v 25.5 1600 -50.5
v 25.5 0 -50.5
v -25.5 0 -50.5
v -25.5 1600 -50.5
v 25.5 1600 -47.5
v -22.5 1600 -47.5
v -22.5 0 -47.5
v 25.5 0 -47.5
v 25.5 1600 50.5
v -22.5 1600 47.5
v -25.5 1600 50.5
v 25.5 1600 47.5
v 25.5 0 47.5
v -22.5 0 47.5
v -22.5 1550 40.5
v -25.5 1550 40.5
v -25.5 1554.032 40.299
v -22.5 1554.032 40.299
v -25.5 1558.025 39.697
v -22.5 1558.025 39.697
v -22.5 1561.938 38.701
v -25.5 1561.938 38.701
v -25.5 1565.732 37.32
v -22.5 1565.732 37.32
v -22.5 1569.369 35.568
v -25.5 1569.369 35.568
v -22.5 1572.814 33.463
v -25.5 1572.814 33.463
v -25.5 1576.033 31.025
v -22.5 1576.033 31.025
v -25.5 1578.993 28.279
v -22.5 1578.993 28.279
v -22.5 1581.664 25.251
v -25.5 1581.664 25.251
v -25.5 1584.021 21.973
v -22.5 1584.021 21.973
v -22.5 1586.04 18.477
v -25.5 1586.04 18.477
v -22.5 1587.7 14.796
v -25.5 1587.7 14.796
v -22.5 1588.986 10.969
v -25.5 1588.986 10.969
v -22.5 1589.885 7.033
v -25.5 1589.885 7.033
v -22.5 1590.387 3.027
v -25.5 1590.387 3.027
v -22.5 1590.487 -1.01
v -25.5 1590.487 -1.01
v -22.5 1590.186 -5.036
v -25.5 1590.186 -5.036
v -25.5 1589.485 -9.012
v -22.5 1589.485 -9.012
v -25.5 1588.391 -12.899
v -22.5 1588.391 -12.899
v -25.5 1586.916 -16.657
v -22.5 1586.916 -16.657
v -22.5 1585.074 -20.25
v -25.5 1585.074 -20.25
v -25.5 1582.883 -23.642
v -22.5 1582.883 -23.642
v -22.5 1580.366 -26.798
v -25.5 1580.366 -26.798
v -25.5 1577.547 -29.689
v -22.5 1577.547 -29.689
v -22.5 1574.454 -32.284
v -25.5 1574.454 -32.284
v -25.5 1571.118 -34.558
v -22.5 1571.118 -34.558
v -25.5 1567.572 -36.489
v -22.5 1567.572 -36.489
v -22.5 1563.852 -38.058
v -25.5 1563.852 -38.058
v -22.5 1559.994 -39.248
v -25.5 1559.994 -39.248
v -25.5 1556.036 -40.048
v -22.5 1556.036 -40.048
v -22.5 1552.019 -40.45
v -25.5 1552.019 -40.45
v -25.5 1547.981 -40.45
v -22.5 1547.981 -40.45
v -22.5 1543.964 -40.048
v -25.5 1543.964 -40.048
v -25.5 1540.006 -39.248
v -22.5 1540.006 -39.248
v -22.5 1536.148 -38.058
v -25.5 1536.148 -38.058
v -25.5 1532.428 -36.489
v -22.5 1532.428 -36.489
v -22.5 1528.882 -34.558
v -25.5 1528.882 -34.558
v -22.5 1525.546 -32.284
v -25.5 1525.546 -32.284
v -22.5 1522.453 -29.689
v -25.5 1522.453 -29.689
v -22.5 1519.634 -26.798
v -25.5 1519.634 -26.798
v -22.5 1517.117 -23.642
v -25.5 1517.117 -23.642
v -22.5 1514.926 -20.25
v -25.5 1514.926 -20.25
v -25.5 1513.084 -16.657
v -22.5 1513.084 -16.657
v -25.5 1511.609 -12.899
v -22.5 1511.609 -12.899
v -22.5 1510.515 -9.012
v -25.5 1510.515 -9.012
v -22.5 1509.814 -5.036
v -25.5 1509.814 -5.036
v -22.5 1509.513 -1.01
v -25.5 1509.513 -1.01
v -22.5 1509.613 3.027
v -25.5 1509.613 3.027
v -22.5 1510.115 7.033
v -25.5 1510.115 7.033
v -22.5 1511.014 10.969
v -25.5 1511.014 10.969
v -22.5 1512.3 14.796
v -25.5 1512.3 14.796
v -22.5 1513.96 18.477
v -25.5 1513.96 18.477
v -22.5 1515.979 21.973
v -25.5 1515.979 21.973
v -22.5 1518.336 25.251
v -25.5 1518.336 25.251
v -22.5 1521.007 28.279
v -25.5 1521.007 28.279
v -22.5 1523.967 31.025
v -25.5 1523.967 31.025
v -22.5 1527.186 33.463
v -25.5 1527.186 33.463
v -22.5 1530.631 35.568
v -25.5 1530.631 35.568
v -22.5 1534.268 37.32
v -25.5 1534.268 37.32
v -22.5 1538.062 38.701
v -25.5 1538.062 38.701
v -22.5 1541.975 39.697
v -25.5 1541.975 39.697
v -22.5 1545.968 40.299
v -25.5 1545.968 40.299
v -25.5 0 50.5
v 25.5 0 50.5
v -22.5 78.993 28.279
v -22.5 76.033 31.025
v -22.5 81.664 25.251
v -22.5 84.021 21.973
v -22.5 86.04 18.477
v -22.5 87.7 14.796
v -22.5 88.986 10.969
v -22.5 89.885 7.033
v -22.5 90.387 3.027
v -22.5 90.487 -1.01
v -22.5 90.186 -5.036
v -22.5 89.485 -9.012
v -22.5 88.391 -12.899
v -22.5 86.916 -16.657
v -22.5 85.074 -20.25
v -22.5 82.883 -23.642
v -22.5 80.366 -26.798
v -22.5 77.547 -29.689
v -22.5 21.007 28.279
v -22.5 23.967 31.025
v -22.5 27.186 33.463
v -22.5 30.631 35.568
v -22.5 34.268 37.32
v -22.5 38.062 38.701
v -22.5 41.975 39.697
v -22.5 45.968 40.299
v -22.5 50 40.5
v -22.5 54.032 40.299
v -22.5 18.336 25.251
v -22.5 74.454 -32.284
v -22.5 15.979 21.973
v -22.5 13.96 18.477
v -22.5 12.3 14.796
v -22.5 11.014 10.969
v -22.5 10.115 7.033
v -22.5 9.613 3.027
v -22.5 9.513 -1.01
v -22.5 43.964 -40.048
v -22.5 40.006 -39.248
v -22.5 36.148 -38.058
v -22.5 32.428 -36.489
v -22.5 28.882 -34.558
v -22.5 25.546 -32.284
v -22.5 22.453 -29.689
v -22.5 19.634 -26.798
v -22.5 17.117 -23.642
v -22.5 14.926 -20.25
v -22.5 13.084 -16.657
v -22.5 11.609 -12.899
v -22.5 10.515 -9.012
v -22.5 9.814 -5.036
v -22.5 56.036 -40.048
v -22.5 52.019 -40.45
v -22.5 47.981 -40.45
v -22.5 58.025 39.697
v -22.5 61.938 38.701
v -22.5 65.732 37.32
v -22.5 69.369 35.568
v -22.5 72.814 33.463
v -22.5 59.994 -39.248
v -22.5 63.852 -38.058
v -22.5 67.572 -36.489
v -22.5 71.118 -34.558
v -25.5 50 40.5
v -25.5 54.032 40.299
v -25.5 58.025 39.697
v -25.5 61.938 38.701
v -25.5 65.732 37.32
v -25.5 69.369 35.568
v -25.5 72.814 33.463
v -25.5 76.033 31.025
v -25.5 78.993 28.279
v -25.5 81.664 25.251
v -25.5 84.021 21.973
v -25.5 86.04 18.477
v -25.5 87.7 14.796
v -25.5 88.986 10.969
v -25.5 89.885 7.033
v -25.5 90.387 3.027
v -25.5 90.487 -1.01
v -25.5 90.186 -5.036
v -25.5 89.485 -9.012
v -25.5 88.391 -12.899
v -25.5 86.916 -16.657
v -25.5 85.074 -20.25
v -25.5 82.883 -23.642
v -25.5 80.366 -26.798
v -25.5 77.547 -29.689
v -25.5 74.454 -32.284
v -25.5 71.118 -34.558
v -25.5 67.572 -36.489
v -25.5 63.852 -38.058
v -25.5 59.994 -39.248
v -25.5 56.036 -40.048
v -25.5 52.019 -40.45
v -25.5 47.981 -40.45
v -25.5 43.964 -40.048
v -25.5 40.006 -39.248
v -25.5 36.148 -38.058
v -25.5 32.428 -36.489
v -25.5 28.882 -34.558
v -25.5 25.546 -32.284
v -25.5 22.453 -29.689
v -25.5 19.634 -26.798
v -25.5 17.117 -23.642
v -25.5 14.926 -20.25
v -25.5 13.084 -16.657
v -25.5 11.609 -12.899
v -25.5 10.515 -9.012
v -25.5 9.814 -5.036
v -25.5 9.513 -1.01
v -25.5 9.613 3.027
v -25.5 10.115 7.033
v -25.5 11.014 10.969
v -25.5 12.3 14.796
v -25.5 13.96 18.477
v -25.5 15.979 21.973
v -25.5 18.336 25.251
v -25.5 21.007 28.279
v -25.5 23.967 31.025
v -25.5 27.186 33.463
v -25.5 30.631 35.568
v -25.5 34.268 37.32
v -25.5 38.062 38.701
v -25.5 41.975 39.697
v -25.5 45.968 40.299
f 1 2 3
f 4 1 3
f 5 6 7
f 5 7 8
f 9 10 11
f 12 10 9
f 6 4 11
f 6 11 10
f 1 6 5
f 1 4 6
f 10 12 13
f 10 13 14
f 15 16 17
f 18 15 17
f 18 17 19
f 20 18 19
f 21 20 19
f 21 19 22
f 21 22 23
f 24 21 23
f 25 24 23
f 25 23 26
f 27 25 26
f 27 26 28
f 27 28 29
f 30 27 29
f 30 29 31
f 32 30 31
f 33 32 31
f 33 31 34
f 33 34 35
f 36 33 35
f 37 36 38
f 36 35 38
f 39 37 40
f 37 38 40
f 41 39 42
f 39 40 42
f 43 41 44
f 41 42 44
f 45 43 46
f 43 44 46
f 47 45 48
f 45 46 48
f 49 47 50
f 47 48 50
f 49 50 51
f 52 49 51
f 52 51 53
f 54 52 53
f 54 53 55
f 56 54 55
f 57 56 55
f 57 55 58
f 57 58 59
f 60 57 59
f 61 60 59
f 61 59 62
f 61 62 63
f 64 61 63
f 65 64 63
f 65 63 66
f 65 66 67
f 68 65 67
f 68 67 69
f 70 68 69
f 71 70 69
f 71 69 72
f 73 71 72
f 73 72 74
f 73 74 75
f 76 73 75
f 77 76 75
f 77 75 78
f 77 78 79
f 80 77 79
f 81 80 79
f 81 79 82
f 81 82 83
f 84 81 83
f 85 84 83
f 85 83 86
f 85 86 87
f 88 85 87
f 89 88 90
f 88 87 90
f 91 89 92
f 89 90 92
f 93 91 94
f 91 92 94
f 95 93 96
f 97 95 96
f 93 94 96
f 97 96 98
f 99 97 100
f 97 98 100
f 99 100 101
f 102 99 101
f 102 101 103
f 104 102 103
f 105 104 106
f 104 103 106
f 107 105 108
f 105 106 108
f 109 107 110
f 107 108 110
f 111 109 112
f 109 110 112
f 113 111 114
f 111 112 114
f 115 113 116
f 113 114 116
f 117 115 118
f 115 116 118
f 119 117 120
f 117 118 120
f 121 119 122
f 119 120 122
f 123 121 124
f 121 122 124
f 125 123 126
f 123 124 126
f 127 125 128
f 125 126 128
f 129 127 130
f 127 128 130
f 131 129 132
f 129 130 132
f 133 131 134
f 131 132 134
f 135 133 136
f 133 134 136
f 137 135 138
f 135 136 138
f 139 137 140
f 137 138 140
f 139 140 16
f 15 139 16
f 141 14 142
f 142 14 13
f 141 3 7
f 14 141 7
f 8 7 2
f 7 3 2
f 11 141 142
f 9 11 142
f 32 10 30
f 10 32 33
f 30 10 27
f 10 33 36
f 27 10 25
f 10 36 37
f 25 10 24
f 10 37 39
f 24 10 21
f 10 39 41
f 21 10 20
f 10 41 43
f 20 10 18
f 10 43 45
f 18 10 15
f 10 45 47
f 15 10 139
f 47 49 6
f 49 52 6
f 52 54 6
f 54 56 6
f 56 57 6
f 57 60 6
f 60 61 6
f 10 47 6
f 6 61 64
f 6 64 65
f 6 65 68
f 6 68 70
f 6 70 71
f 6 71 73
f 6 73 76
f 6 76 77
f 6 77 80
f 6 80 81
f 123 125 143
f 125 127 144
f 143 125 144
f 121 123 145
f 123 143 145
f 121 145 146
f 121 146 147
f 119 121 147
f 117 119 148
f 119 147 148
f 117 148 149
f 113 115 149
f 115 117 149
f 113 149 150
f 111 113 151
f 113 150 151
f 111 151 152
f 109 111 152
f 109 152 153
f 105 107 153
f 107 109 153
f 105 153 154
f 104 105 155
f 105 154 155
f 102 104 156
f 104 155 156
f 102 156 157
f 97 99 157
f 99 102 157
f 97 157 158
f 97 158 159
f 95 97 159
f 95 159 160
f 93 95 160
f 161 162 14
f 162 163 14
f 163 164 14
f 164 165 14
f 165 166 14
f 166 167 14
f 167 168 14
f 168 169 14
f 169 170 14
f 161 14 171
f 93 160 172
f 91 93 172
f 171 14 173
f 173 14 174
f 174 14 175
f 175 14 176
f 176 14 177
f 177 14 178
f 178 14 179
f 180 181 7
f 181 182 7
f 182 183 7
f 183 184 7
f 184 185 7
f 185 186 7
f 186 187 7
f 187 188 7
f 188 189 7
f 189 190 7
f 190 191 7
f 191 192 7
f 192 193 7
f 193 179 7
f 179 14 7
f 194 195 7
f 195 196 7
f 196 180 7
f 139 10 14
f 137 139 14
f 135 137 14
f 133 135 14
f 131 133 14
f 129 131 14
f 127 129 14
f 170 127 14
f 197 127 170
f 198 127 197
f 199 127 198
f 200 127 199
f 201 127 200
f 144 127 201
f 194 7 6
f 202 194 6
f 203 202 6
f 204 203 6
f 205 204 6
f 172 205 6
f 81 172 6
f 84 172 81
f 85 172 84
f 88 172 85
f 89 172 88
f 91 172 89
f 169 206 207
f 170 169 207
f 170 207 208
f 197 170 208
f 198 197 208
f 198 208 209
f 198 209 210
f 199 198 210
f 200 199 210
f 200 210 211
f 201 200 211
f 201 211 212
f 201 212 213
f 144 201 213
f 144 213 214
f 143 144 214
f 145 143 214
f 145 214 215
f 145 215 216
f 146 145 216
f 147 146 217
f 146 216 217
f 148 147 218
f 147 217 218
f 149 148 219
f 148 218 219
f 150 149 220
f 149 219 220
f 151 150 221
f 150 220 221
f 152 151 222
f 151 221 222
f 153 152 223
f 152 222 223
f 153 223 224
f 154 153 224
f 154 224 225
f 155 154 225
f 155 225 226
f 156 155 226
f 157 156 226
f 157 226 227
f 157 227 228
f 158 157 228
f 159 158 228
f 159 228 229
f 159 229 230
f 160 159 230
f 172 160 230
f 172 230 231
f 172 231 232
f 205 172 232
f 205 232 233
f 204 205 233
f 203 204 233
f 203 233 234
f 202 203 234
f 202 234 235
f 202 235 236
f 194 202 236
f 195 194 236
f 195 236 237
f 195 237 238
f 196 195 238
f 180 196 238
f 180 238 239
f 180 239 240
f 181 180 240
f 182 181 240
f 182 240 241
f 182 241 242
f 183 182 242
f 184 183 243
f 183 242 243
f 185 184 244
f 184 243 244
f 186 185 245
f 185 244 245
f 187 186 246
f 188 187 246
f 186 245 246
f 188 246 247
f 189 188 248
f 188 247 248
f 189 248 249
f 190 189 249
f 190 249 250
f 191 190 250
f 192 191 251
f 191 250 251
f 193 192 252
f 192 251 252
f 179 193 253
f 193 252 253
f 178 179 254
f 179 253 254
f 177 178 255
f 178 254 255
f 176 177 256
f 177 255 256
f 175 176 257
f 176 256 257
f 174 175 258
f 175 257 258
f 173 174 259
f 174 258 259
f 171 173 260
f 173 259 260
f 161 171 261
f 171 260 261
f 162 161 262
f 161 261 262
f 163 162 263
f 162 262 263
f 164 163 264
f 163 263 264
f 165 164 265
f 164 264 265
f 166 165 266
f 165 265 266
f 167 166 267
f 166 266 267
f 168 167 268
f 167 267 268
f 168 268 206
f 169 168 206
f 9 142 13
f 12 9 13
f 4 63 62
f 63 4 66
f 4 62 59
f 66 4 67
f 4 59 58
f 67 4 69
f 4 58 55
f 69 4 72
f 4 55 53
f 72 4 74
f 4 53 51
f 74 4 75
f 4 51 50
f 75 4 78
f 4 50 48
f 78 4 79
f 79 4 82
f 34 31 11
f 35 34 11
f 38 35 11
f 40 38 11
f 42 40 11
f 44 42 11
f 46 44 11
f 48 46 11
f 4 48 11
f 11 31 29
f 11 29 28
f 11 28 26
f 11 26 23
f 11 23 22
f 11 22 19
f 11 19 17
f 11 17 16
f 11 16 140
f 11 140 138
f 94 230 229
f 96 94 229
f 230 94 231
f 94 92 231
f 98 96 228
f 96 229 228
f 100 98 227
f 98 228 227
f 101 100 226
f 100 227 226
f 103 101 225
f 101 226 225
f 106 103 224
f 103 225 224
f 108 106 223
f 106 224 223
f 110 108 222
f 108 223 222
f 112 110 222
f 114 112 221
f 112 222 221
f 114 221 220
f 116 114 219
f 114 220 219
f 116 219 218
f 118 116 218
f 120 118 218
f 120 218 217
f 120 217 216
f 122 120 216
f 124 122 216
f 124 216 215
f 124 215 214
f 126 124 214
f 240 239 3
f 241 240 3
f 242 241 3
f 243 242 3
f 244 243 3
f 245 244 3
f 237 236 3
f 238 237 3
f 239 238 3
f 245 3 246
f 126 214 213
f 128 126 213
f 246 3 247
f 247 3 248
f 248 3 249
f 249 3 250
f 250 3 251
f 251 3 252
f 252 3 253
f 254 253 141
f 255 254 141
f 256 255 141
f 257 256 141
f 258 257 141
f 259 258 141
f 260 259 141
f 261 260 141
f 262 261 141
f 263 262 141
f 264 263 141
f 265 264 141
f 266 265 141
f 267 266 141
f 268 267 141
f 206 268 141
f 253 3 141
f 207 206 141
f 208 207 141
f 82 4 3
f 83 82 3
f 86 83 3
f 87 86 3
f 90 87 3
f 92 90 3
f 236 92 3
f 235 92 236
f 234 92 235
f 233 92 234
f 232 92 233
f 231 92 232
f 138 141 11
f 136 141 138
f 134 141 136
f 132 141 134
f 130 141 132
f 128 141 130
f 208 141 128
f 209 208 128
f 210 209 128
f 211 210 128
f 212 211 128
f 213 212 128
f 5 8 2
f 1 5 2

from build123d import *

# Parameters (mm, degrees)
BOSS_EXTRUDE2_DEPTH = 1600
SKETCH3_R           = 40.5
CUT_EXTRUDE2_DEPTH  = 52


with BuildPart() as part:
    # Sketch2 → Boss-Extrude2 (new body)
    with BuildSketch(Plane(origin=(0, 0, 0), x_dir=(1, 0, 0), z_dir=(0, 1, 0))):
        Polygon((-22.5, 47.5), (25.5, 47.5), (25.5, 50.5), (-25.5, 50.5), (-25.5, -50.5), (25.5, -50.5), (25.5, -47.5), (-22.5, -47.5), align=None)
    extrude(amount=BOSS_EXTRUDE2_DEPTH)

    # Sketch3 → Cut-Extrude2 (cut, through all)
    with BuildSketch(Plane.ZY.offset(25.5)):
        with Locations((0, 50)):
            Circle(SKETCH3_R)
        with Locations((0, 1550)):
            Circle(SKETCH3_R)
    extrude(amount=-CUT_EXTRUDE2_DEPTH, mode=Mode.SUBTRACT)


solid = part.part
